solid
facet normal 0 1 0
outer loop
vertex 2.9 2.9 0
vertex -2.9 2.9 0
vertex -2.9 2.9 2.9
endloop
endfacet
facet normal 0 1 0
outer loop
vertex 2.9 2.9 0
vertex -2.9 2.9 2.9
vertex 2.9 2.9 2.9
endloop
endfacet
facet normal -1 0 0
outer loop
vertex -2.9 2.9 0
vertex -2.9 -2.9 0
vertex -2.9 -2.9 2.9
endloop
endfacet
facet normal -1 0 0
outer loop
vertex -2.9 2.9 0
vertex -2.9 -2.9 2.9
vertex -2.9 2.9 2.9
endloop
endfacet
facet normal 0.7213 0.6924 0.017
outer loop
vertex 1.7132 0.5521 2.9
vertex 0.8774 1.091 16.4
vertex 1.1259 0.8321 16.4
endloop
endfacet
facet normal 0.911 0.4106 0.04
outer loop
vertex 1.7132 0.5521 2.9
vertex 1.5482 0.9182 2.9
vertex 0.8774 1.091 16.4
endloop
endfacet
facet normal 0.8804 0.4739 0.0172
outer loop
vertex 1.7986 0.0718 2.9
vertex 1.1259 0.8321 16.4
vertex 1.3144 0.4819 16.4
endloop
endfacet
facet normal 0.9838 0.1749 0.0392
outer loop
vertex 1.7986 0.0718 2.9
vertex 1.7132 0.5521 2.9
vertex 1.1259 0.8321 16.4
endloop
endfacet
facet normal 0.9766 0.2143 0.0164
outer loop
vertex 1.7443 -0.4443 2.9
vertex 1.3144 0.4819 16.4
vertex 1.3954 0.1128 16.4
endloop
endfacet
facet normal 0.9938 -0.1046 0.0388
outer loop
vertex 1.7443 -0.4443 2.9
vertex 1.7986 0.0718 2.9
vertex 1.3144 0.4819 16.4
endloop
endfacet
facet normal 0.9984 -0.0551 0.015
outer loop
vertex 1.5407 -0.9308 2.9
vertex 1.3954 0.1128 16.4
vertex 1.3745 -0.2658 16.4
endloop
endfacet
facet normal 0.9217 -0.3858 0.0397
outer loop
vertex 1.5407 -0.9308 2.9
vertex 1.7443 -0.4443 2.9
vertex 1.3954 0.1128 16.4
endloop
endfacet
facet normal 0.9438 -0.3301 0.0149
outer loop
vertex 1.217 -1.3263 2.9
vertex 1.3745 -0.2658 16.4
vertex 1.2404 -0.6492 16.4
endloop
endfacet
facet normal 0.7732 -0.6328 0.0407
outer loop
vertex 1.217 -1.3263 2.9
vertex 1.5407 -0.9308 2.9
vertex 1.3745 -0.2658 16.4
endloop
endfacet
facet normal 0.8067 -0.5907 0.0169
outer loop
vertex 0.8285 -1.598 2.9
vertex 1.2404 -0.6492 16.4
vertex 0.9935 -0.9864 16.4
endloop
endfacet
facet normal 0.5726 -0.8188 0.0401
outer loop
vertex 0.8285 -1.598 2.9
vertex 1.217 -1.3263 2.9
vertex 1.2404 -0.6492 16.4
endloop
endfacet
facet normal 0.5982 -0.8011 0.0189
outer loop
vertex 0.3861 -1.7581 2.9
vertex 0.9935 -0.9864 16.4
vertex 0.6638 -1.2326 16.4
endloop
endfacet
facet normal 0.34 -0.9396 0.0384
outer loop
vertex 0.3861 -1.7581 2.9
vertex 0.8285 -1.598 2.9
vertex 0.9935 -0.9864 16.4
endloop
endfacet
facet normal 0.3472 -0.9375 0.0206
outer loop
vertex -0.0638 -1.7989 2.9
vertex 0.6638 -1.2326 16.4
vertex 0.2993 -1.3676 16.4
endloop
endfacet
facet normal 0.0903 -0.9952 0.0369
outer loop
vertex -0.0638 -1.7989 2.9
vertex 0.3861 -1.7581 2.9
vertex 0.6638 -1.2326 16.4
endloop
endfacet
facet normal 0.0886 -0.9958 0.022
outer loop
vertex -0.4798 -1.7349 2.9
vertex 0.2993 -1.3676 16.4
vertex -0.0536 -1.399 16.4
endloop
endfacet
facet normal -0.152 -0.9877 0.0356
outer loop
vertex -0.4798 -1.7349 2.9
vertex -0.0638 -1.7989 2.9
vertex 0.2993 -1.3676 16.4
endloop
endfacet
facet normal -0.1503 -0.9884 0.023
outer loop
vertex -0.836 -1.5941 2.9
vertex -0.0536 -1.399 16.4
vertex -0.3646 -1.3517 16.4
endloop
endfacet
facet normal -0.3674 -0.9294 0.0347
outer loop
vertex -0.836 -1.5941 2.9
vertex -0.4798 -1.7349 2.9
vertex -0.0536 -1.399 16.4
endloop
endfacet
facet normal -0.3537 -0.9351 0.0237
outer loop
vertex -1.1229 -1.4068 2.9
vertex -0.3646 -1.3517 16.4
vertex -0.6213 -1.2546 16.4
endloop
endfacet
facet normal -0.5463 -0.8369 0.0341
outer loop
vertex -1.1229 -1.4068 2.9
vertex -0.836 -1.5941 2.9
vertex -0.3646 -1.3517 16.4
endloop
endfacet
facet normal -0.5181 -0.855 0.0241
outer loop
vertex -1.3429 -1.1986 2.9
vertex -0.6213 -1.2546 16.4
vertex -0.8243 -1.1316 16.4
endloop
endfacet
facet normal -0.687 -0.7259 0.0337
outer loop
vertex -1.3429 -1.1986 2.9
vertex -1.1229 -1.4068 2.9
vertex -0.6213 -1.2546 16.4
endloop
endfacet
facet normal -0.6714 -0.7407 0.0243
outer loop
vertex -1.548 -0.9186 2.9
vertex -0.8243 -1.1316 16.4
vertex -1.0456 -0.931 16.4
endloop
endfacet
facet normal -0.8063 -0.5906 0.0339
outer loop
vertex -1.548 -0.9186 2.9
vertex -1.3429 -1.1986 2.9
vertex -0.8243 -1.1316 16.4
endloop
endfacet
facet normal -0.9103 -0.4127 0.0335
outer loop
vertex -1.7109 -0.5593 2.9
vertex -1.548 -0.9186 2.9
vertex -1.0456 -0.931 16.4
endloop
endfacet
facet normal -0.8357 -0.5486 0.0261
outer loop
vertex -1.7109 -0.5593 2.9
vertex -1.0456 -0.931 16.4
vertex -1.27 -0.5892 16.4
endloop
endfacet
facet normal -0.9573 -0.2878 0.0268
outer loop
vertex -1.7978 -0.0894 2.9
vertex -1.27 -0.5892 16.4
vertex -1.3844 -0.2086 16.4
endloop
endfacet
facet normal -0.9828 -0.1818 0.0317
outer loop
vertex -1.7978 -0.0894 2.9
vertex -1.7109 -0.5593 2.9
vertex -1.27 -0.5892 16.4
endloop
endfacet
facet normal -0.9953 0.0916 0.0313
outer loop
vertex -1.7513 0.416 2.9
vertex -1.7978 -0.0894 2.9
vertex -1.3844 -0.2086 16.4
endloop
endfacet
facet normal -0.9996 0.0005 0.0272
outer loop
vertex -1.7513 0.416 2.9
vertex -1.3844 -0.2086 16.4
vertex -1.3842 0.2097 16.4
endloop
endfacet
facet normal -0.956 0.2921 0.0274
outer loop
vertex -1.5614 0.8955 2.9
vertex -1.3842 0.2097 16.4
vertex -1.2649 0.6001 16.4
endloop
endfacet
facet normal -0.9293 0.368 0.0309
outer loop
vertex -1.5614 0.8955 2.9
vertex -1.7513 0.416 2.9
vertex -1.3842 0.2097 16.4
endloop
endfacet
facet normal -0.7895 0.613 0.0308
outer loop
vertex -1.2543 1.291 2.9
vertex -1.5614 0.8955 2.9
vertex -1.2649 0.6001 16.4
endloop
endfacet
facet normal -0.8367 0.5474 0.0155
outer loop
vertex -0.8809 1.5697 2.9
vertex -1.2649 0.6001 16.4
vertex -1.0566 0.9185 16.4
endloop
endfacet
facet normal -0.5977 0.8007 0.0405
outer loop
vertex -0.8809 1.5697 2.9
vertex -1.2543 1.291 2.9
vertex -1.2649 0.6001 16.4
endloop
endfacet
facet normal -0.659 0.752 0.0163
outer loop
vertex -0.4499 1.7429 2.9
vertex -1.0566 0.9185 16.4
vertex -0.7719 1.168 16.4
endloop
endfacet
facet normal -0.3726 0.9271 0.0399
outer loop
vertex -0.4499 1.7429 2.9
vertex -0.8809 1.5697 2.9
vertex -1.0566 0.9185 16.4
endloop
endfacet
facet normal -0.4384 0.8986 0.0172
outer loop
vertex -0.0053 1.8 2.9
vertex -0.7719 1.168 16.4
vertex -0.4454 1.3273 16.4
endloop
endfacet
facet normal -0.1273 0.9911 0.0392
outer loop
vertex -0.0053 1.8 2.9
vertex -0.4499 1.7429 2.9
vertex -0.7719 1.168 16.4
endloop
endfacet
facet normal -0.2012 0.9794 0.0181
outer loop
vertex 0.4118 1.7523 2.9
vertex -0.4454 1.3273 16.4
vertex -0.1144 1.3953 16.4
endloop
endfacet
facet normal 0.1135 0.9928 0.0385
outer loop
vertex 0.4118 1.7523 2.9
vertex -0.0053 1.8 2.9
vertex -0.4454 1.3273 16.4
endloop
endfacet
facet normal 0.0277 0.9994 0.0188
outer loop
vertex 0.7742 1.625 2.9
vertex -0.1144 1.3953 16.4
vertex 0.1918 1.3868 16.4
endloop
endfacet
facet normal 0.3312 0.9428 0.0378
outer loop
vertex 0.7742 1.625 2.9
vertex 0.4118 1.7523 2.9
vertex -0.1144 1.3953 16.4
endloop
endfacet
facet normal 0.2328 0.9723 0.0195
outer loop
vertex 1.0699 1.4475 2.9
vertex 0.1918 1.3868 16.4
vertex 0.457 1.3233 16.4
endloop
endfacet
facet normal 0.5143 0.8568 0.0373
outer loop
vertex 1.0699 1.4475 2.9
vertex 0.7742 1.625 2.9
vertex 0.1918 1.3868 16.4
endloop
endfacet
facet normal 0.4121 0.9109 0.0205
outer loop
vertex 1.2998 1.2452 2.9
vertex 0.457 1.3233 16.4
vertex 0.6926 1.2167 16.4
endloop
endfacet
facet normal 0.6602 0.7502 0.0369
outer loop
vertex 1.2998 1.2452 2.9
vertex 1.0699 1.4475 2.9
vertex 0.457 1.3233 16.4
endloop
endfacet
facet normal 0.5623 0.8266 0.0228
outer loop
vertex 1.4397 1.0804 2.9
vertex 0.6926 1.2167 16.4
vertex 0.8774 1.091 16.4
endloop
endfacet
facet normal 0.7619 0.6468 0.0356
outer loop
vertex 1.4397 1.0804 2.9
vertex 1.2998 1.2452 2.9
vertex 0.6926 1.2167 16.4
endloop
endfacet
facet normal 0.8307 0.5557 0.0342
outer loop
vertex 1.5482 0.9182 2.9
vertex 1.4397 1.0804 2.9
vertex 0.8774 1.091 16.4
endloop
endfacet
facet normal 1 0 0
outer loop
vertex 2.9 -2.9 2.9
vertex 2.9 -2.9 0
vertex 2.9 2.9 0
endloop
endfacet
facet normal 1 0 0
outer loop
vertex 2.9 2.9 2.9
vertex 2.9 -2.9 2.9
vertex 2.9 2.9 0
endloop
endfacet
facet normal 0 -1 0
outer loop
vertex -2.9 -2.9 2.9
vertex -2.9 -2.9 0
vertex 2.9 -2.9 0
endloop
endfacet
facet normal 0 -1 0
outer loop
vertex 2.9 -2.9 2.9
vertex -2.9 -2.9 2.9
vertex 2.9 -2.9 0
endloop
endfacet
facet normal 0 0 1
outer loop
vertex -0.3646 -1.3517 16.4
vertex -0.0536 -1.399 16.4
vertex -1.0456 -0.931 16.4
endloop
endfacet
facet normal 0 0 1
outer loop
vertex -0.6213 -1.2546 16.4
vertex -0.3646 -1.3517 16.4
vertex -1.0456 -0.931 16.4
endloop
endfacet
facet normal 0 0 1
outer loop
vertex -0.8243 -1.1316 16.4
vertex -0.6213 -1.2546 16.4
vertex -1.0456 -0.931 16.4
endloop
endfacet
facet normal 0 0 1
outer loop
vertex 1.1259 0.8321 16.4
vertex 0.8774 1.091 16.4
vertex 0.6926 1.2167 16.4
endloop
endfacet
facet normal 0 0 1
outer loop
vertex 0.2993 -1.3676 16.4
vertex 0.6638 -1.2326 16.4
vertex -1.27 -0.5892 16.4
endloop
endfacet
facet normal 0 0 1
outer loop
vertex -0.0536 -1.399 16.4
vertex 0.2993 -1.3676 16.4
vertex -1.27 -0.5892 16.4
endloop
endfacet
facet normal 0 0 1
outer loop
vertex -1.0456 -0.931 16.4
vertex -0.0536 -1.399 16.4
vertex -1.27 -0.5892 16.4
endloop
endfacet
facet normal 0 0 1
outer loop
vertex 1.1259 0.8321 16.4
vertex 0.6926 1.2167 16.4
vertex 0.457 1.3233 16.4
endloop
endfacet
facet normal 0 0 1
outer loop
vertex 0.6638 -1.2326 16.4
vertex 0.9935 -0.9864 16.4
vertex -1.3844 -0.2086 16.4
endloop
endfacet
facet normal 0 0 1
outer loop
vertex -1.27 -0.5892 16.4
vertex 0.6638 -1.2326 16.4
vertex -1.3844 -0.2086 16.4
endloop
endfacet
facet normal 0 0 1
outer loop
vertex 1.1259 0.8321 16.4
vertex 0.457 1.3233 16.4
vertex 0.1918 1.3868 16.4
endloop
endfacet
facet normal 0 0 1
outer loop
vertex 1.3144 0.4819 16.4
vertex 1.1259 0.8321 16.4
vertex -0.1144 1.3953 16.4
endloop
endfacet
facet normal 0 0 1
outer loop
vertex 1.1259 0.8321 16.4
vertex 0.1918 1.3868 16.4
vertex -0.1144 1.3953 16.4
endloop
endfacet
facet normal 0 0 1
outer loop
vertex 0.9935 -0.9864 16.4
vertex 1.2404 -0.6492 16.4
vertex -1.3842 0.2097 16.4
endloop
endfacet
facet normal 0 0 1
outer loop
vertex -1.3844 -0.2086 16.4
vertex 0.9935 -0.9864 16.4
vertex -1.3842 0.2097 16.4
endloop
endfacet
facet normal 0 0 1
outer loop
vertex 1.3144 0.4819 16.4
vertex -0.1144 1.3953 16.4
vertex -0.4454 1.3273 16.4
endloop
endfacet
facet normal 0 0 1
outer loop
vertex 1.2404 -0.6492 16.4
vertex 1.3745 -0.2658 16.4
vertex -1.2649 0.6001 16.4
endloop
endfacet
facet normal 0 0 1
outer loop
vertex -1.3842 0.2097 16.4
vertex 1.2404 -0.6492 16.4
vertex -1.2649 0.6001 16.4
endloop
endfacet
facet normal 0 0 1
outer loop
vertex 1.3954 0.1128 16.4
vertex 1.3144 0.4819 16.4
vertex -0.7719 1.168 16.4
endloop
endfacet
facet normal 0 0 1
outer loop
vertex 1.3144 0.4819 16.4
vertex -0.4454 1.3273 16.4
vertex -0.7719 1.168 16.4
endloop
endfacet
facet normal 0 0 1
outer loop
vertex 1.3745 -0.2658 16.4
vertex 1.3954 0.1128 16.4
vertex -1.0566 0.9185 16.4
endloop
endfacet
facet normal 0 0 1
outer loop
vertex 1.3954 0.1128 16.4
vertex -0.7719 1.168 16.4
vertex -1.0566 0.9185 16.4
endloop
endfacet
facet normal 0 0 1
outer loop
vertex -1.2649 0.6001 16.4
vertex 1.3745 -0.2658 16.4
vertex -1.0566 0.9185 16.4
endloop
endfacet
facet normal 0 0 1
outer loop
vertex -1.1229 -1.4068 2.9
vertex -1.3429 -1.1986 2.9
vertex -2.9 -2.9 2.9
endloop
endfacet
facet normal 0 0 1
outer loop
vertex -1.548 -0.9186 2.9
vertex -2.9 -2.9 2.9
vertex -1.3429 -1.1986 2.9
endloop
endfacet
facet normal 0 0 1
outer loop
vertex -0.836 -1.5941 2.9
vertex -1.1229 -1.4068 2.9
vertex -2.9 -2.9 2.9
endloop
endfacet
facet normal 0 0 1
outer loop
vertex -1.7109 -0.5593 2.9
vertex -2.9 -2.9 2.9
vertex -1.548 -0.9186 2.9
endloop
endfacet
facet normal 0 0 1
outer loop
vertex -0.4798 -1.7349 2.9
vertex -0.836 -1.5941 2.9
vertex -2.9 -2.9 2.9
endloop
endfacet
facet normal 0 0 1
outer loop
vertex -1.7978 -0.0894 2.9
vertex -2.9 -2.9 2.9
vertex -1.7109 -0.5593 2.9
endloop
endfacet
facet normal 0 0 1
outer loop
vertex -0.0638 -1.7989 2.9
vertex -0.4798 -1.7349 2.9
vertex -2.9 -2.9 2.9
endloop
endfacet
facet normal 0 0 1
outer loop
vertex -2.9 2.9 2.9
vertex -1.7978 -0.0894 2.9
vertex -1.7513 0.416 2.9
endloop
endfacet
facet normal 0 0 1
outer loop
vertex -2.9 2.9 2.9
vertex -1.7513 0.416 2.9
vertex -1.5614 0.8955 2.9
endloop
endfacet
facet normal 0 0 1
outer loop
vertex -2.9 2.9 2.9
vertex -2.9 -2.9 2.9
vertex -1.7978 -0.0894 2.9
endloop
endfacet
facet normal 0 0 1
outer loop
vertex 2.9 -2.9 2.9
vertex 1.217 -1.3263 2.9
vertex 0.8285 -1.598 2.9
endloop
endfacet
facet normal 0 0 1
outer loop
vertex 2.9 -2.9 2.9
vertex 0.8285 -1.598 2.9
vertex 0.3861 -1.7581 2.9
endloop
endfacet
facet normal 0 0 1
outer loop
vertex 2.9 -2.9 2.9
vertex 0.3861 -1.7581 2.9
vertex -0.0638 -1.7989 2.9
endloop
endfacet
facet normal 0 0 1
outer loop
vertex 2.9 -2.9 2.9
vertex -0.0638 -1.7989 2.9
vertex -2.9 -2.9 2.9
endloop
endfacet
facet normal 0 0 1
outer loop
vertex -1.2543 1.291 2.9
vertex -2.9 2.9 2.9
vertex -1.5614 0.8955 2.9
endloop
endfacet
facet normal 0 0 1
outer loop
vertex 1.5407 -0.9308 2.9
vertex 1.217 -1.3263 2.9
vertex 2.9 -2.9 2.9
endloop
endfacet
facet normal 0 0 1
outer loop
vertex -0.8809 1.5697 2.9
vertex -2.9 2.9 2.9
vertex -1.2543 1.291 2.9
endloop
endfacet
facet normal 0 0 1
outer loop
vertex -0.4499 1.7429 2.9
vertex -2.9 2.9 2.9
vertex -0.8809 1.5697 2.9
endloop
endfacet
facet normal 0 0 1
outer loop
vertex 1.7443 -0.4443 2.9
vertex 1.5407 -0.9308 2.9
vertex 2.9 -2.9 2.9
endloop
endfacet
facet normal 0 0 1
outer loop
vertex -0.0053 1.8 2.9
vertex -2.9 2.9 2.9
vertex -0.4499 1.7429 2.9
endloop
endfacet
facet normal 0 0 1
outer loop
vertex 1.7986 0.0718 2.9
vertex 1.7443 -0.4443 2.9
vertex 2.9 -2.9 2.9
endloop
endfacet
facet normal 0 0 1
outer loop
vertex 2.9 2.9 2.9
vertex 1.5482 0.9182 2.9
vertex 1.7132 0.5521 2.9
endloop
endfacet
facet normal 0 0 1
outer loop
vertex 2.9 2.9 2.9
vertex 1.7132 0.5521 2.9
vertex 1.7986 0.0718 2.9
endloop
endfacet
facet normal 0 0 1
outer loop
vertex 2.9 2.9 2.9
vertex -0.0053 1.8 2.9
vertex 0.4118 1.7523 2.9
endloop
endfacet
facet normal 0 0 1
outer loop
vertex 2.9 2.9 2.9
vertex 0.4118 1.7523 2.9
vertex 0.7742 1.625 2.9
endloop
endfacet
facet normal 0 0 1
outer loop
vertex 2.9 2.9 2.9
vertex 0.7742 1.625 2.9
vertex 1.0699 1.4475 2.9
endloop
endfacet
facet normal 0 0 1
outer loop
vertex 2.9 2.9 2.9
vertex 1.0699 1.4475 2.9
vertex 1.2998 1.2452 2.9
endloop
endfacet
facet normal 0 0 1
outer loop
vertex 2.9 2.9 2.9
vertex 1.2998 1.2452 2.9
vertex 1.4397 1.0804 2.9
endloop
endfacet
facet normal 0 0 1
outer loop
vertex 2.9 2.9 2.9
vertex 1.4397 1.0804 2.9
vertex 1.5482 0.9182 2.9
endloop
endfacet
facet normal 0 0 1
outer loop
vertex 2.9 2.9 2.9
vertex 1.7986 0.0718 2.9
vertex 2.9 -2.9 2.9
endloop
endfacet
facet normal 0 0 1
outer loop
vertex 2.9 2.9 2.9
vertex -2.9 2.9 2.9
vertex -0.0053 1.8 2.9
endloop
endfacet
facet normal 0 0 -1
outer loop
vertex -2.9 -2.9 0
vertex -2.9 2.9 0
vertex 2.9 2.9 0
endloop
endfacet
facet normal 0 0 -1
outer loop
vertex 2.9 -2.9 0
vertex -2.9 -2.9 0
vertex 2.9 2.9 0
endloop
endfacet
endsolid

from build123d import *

# Parameters (mm, degrees)
SKETCH1_W           = 5.8
SKETCH1_H           = 5.8
BOSS_EXTRUDE1_DEPTH = 2.9


with BuildPart() as part:
    # Sketch1 → Boss-Extrude1 (new body)
    with BuildSketch(Plane.XY):
        Rectangle(SKETCH1_W, SKETCH1_H)
    extrude(amount=BOSS_EXTRUDE1_DEPTH)

    # Loft1: read off the stored shape, not the designer's step
    # Loft1: loft between two sections, ruled curve by curve
    loft1_from = [
        Edge.make_bspline([(0.877386601, 1.090959556, 16.4), (3.059305712, -0.663813647, 16.4), (1.30453251, -2.845732758, 16.4), (-0.877386601, -1.090959556, 16.4), (-3.059305712, 0.663813647, 16.4), (-1.30453251, 2.845732758, 16.4), (0.877386601, 1.090959556, 16.4)], [0, 0, 0, 0, 0.5, 0.5, 0.5, 1, 1, 1, 1], 3, [1, 0.333333333, 0.333333333, 1, 0.333333333, 0.333333333, 1]),
    ]
    loft1_to = [
        Edge.make_bspline([(1.548183001, 0.918220777, 2.9), (3.384624555, -2.178145225, 2.9), (0.288258553, -4.014586779, 2.9), (-1.548183001, -0.918220777, 2.9), (-3.384624555, 2.178145225, 2.9), (-0.288258553, 4.014586779, 2.9), (1.548183001, 0.918220777, 2.9)], [0, 0, 0, 0, 0.5, 0.5, 0.5, 1, 1, 1, 1], 3, [1, 0.333333333, 0.333333333, 1, 0.333333333, 0.333333333, 1]),
    ]
    loft1 = Solid(Shell([*[Face.make_surface_from_curves(loft1_from[k], loft1_to[k]) for k in range(1)], Face(Wire(loft1_from)), Face(Wire(loft1_to))]))
    add(loft1)


solid = part.part
